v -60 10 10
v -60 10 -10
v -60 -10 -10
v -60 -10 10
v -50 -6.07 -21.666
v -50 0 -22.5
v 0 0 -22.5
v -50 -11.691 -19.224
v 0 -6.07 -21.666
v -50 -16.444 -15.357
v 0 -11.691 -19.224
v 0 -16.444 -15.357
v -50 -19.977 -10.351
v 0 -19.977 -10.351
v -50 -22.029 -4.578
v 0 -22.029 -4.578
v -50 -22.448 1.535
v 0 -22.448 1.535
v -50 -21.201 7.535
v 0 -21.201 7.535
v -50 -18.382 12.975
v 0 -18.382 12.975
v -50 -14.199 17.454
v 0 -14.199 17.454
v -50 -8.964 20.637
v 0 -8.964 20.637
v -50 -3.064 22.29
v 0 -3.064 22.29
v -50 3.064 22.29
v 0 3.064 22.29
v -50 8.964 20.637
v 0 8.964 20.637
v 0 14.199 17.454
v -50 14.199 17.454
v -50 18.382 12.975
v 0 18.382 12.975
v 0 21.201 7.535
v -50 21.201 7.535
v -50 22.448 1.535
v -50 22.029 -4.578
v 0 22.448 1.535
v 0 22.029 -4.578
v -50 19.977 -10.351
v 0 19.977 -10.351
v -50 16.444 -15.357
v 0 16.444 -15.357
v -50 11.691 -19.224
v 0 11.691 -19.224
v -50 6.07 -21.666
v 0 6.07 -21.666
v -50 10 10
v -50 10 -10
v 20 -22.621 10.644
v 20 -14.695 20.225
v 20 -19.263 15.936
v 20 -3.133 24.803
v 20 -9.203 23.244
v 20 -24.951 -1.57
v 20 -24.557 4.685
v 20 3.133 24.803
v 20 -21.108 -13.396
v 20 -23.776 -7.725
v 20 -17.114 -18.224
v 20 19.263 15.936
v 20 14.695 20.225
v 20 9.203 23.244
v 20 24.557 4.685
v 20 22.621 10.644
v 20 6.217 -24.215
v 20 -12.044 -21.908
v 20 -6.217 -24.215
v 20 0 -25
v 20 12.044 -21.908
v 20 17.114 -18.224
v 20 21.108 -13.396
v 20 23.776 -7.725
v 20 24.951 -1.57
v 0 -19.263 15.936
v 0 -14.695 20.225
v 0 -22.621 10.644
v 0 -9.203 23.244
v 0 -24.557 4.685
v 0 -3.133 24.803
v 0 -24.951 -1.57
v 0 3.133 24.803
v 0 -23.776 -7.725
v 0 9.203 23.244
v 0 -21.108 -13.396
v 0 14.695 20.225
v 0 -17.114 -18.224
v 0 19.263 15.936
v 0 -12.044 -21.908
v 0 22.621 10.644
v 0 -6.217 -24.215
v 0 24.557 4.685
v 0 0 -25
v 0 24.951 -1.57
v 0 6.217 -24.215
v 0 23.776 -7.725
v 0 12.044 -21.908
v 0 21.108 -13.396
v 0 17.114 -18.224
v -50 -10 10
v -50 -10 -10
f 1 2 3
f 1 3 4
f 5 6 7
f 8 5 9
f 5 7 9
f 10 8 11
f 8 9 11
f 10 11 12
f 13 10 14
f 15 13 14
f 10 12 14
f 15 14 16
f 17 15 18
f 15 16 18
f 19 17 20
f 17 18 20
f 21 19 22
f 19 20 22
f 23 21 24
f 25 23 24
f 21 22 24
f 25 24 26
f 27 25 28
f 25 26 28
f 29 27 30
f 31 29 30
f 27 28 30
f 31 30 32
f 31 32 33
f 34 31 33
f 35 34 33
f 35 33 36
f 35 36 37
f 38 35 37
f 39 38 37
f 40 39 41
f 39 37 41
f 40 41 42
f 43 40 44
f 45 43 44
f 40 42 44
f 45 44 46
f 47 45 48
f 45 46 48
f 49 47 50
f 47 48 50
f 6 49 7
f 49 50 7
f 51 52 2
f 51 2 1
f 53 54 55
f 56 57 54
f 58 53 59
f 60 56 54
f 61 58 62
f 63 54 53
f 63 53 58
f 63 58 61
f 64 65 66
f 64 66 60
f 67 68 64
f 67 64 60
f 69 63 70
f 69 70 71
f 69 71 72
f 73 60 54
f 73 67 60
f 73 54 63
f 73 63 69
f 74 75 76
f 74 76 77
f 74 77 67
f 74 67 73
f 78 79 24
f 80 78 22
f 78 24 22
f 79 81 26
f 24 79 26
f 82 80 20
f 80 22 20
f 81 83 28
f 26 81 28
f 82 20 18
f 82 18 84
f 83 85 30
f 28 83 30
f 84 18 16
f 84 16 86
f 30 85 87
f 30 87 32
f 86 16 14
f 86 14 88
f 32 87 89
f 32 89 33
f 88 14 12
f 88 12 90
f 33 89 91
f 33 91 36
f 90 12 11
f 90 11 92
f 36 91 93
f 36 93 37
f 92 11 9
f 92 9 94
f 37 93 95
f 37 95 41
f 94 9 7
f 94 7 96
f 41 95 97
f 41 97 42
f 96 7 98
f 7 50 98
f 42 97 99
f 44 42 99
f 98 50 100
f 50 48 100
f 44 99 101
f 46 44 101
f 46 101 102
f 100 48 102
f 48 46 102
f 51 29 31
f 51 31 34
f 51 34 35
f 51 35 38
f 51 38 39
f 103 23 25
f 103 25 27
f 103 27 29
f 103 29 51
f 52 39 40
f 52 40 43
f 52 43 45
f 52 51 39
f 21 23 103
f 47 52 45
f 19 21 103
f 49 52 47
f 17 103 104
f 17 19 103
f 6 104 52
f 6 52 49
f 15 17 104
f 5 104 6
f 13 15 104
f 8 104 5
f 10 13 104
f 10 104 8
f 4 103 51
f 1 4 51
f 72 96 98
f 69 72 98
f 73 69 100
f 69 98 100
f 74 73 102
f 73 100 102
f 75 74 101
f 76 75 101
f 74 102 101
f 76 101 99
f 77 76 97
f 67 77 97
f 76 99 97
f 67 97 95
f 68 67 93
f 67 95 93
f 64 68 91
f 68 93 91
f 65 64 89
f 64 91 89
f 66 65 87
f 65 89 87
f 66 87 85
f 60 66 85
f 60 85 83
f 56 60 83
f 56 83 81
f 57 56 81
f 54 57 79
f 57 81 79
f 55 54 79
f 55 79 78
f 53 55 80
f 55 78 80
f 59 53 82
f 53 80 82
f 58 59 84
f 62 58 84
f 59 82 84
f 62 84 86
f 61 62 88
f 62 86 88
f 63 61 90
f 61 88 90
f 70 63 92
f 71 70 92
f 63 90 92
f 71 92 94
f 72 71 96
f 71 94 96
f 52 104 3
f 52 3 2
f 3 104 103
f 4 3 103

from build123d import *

# Parameters (mm, degrees)
SKETCH_1_R      = 25
EXTRUDE_1_DEPTH = 20
SKETCH_2_W      = 20
SKETCH_2_H      = 20
EXTRUDE_2_DEPTH = 60
SKETCH_3_R      = 22.5
EXTRUDE_3_DEPTH = 50


with BuildPart() as part:
    # 草图1 → 凸台-拉伸1 (new body)
    with BuildSketch(Plane(origin=(0, 0, 0), x_dir=(0, 0, -1), z_dir=(1, 0, 0))):
        Circle(SKETCH_1_R)
    extrude(amount=EXTRUDE_1_DEPTH)

    # 草图2 → 凸台-拉伸2 (add)
    with BuildSketch(Plane.ZY):
        Rectangle(SKETCH_2_W, SKETCH_2_H)
    extrude(amount=EXTRUDE_2_DEPTH)

    # 草图3 → 凸台-拉伸3 (add)
    with BuildSketch(Plane.ZY):
        with Locations(Location((0, 0, 0), (0, 0, 180))):
            Circle(SKETCH_3_R)
    extrude(amount=EXTRUDE_3_DEPTH)


solid = part.part
